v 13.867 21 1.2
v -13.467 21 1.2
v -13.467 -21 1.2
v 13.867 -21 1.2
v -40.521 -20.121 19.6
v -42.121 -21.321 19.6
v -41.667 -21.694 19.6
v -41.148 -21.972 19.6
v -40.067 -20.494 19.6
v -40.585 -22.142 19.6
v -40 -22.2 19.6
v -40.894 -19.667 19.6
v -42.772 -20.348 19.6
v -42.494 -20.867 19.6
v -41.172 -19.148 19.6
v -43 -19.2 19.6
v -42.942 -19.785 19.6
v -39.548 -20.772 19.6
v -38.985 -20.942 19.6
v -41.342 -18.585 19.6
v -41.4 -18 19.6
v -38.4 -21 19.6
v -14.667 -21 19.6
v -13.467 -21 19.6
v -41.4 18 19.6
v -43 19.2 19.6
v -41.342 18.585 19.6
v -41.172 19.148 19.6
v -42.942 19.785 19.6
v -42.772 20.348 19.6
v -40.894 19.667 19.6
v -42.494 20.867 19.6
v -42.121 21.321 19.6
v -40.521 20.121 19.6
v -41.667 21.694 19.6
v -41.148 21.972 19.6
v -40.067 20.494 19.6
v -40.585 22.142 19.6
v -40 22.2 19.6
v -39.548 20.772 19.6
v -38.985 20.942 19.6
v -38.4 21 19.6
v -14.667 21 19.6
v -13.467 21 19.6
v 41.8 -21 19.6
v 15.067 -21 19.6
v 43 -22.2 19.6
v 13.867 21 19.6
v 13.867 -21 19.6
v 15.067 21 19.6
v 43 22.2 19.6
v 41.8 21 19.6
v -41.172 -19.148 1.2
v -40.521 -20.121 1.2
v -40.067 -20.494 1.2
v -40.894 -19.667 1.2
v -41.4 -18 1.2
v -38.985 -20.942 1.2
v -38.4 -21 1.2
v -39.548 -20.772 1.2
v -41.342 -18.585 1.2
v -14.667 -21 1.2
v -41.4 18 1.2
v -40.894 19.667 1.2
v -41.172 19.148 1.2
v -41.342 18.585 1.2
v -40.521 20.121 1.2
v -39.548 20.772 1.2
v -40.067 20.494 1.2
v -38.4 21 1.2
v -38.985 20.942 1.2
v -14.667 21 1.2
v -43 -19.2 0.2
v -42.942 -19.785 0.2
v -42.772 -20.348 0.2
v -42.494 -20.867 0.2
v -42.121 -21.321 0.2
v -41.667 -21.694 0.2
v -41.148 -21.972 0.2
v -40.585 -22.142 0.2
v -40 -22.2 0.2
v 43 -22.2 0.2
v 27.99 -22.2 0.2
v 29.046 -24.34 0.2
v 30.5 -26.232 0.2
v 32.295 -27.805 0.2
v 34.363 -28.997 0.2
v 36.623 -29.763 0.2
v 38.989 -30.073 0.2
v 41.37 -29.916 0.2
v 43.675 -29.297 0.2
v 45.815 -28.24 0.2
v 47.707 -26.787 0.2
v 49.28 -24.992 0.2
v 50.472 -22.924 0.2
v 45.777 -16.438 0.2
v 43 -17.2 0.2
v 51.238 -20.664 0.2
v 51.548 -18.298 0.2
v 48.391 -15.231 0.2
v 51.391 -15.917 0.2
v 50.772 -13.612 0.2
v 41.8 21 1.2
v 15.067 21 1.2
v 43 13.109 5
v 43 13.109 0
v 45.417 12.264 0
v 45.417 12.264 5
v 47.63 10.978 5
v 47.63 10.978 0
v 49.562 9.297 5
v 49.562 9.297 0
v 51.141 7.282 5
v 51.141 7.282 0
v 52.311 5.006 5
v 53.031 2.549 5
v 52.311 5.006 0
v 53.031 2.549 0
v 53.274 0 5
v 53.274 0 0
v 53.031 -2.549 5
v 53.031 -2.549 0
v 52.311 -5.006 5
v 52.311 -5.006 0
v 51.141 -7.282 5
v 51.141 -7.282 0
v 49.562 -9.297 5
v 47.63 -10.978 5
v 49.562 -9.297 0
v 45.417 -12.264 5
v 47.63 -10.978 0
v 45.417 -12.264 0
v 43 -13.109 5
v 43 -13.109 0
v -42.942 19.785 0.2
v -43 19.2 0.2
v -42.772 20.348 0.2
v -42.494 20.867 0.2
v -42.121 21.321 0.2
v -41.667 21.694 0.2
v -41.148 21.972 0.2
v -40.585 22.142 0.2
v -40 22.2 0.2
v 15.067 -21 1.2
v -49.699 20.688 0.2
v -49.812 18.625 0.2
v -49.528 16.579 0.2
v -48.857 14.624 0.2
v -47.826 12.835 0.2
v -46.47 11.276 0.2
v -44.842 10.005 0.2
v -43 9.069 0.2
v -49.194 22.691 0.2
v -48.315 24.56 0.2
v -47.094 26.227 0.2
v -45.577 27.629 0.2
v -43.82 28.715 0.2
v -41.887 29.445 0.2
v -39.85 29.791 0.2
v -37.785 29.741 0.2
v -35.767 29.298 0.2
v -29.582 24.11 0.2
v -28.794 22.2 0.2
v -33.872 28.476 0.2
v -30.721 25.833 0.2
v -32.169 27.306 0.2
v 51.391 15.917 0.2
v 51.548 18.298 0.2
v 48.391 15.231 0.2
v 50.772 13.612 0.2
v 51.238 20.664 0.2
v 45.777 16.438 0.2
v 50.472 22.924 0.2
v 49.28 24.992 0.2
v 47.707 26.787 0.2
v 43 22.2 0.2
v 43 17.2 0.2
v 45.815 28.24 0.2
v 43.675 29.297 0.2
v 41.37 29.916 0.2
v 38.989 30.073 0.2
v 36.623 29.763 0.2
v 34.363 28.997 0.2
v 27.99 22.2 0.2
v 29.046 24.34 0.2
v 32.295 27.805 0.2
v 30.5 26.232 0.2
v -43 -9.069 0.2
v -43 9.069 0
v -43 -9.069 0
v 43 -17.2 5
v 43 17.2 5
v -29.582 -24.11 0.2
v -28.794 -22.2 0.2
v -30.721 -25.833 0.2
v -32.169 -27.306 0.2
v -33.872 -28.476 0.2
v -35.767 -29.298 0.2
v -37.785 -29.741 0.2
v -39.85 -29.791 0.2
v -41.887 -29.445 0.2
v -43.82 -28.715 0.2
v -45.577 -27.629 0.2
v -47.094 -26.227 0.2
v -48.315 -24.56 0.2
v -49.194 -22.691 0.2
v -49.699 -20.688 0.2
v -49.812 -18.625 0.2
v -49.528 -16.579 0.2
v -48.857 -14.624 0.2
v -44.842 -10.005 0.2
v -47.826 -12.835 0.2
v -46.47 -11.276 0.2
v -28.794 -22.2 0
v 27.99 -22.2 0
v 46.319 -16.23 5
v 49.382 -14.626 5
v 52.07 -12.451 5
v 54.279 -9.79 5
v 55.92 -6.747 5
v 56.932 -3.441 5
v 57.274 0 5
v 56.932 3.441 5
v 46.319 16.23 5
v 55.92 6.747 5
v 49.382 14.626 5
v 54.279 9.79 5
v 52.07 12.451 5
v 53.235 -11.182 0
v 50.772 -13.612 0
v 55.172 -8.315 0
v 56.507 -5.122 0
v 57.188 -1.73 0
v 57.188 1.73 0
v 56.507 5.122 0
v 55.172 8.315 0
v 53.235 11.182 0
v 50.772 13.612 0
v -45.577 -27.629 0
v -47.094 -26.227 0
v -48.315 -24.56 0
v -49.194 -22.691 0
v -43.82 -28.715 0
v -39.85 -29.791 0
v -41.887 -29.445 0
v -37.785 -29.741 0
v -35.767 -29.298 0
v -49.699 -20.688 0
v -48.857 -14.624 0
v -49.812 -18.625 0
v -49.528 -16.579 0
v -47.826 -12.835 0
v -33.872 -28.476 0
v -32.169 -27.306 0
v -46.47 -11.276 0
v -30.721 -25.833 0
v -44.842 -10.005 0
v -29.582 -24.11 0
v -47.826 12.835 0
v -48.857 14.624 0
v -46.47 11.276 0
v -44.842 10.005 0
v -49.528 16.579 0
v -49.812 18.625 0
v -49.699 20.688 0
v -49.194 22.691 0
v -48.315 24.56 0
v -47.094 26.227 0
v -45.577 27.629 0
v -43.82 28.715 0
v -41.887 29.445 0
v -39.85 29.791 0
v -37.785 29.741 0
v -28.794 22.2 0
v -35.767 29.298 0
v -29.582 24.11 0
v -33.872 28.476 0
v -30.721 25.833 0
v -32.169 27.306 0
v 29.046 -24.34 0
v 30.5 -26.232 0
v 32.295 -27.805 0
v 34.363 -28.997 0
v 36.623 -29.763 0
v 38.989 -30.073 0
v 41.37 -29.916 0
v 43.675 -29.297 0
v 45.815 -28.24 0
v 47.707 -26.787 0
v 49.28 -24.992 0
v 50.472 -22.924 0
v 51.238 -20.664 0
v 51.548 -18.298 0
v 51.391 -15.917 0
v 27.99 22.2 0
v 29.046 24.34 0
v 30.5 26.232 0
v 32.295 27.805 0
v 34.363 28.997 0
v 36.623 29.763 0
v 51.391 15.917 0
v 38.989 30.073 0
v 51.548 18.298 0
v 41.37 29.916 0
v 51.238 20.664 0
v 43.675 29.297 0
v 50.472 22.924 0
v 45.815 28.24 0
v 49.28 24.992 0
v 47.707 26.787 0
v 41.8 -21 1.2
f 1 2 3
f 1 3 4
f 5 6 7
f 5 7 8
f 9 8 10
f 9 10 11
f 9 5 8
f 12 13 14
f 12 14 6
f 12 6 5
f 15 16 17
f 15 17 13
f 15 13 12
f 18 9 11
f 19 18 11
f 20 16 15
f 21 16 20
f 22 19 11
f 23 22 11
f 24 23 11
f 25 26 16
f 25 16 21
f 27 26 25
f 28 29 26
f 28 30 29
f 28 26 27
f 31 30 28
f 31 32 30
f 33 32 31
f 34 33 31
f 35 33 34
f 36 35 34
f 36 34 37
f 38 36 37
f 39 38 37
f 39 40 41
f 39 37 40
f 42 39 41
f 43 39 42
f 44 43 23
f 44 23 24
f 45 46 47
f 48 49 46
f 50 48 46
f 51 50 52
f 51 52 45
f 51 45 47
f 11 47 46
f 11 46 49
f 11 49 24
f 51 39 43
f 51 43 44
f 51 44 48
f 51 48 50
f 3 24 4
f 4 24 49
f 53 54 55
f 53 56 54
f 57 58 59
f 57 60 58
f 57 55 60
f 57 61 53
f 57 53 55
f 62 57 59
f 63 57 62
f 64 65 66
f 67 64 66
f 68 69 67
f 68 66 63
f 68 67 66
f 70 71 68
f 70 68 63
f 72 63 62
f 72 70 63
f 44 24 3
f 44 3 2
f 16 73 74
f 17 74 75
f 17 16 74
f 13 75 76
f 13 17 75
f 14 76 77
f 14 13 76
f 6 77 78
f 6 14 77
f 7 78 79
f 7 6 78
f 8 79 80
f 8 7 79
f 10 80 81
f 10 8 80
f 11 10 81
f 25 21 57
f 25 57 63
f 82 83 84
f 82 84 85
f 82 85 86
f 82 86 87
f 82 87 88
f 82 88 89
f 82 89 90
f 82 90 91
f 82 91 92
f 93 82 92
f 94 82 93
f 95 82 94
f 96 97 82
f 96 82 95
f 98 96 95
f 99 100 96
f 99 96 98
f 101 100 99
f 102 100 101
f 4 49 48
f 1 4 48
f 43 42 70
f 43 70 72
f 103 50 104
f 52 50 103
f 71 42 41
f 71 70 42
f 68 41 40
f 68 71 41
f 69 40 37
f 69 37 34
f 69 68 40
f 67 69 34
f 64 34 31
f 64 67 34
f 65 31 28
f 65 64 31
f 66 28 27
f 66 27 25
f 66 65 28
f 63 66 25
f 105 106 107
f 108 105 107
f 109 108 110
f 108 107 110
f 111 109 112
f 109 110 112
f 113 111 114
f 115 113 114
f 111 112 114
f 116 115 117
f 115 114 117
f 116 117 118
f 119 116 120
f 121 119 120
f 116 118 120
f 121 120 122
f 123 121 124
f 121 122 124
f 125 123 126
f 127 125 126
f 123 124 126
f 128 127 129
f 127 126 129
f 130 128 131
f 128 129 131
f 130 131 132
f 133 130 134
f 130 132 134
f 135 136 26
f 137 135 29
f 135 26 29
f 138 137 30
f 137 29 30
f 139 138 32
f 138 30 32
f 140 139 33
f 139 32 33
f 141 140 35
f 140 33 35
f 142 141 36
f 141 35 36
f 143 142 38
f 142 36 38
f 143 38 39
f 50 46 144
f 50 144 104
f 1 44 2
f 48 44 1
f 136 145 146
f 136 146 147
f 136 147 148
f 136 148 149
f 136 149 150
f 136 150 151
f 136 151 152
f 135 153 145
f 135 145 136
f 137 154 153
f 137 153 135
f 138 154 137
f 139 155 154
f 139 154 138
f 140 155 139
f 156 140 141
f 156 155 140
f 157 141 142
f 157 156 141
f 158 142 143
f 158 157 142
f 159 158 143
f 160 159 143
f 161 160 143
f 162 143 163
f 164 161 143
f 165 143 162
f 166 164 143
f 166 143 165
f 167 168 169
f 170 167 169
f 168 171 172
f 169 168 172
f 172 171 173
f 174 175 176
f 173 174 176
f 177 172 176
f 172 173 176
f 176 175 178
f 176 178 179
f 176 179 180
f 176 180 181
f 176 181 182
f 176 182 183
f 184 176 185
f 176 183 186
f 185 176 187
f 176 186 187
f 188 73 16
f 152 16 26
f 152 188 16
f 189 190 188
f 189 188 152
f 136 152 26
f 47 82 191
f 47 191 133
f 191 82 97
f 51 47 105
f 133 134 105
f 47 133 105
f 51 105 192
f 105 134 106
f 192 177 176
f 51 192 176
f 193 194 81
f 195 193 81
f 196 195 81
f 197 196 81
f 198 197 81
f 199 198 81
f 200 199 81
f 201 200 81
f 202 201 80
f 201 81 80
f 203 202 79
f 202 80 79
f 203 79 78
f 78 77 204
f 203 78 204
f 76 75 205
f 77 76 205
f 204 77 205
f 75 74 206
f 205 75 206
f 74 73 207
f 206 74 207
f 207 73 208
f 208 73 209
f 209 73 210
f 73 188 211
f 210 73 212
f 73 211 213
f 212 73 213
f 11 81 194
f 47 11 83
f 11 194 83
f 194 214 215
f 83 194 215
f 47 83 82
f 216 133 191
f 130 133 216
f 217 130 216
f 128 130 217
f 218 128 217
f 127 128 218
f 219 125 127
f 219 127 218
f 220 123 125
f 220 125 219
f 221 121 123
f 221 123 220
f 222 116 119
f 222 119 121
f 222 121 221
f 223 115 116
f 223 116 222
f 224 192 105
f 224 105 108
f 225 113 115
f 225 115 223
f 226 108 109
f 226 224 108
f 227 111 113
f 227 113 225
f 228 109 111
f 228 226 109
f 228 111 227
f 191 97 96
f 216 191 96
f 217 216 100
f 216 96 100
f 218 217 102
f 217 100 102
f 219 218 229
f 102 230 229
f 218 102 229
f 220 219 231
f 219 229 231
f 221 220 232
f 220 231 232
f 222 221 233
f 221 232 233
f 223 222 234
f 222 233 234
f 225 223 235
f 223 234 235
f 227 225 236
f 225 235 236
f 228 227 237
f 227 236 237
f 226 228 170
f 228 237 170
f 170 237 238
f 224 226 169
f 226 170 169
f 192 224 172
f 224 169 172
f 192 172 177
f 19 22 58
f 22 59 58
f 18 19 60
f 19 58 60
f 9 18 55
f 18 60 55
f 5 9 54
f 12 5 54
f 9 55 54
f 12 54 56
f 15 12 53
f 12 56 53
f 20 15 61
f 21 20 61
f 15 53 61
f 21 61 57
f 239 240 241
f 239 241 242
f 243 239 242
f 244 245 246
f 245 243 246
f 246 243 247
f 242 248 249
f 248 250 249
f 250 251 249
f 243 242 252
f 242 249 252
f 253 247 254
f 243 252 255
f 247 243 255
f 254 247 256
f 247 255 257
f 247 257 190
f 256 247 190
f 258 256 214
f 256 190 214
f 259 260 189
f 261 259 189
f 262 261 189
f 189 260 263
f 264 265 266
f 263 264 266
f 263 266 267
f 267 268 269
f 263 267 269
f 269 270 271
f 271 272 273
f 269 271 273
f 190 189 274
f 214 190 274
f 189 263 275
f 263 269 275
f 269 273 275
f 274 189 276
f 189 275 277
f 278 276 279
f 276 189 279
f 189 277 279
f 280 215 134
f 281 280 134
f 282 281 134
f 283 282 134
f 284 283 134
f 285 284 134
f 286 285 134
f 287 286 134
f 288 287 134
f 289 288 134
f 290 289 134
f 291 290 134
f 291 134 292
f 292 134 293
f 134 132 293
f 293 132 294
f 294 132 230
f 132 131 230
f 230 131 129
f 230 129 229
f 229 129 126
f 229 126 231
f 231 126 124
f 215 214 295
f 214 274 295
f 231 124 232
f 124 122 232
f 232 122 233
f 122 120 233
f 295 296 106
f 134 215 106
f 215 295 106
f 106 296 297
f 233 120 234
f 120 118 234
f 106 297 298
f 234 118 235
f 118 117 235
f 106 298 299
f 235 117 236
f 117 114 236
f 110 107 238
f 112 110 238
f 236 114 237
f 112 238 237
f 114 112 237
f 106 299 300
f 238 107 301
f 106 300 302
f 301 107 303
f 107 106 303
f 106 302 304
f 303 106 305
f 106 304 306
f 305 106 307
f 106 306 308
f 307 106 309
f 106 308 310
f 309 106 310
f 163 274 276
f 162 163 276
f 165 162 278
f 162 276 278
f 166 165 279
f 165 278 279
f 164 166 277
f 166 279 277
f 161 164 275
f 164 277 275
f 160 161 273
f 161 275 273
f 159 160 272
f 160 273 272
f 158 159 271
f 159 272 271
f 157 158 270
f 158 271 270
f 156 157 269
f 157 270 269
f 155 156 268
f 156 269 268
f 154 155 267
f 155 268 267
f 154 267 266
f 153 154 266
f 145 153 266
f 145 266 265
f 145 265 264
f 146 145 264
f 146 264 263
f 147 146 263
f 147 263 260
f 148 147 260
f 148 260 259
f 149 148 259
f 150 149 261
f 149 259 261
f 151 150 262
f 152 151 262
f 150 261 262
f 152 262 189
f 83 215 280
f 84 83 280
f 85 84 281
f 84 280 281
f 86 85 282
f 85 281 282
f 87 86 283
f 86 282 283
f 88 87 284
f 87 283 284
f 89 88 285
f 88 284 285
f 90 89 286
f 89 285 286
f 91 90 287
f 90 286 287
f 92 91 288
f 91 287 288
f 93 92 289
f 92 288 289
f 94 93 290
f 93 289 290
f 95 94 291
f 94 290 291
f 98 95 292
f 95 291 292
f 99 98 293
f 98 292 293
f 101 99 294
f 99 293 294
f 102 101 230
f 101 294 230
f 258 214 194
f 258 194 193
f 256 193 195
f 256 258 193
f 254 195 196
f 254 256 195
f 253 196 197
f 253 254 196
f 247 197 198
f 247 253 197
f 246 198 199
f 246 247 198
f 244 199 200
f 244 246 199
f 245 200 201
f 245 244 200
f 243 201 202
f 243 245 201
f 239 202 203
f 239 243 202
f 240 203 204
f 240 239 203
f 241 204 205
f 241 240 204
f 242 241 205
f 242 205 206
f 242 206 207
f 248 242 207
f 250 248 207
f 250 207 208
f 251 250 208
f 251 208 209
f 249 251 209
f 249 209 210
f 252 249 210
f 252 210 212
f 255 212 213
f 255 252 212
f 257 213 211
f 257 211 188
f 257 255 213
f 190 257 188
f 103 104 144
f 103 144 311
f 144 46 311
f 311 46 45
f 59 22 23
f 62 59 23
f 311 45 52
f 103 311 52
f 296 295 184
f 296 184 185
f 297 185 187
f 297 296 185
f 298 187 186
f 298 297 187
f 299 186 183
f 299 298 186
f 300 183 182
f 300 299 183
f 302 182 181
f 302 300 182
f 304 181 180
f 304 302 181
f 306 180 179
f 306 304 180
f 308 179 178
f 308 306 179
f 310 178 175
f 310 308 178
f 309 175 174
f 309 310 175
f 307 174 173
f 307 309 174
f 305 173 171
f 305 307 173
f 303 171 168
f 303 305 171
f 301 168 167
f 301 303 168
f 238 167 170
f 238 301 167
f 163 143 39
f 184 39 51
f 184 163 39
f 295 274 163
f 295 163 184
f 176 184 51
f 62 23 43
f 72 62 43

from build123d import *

# Parameters (mm, degrees)
SKETCH_1_W          = 86
SKETCH_1_H          = 44.4
EXTRUDE_1_DEPTH     = 19.6
EXTRUDE_2_DEPTH     = 5
SKETCH_3_W          = 26.733333333
SKETCH_3_H          = 42
SKETCH_3_W_2        = 27.333333334
CUT_EXTRUDE_1_DEPTH = 18.4
FILLET_1_R          = 3
EXTRUDE_3_DEPTH     = 0.2


with BuildPart() as part:
    # Эскиз1 → Бобышка-Вытянуть1 (new body)
    with BuildSketch(Plane.XY):
        Rectangle(SKETCH_1_W, SKETCH_1_H)
    extrude(amount=EXTRUDE_1_DEPTH)

    # Эскиз2 → Бобышка-Вытянуть2 (add)
    with BuildSketch(Plane.XY):
        with BuildLine():
            Line((43, 17.2), (43, 13.108775687))
            ThreePointArc((43, 13.108775687), (53.273546839, 0), (43, -13.108775687))
            Line((43, -13.108775687), (43, -17.2))
            ThreePointArc((43, -17.2), (57.273546839, 0), (43, 17.2))
        make_face()
    extrude(amount=EXTRUDE_2_DEPTH)

    # Эскиз3 → Вырез-Вытянуть1 (cut)
    with BuildSketch(Plane.XY.offset(19.6)):
        with Locations((-28.033333334, 0)):
            Rectangle(SKETCH_3_W, SKETCH_3_H)
        with Locations((0.2, 0)):
            Rectangle(SKETCH_3_W_2, SKETCH_3_H)
        with Locations((28.433333334, 0)):
            Rectangle(SKETCH_3_W, SKETCH_3_H)
    extrude(amount=-CUT_EXTRUDE_1_DEPTH, mode=Mode.SUBTRACT)

    # Скругление1
    fillet_1_edges = [part.edges().sort_by_distance(p)[0] for p in [
        (-41.4, 21, 10.4),
        (-41.4, -21, 10.4),
        (-43, -22.2, 9.8),
        (-43, 22.2, 9.8),
    ]]
    fillet(fillet_1_edges, radius=FILLET_1_R)

    # Эскиз4 → Бобышка-Вытянуть3 (add)
    with BuildSketch(Plane(origin=(0, 0, 0), x_dir=(-1, 0, 0), z_dir=(0, 0, -1))):
        with BuildLine():
            Line((-50.772048757, 13.611868188), (-27.989807175, 22.2))
            ThreePointArc((-27.989807175, 22.2), (-43.674993872, 29.297054885), (-50.772048757, 13.611868188))
        make_face()
        with BuildLine():
            Line((-50.772048757, -13.611868188), (-27.989807175, -22.2))
            ThreePointArc((-27.989807175, -22.2), (-43.674993872, -29.297054885), (-50.772048757, -13.611868188))
        make_face()
        with BuildLine():
            Line((43, 9.068731744), (28.793502644, 22.2))
            ThreePointArc((28.793502644, 22.2), (46.369205759, 26.964337461), (43, 9.068731744))
        make_face()
        with BuildLine():
            Line((43, -9.068731744), (28.793502644, -22.2))
            ThreePointArc((28.793502644, -22.2), (46.369205759, -26.964337461), (43, -9.068731744))
        make_face()
    extrude(amount=-EXTRUDE_3_DEPTH)


solid = part.part
